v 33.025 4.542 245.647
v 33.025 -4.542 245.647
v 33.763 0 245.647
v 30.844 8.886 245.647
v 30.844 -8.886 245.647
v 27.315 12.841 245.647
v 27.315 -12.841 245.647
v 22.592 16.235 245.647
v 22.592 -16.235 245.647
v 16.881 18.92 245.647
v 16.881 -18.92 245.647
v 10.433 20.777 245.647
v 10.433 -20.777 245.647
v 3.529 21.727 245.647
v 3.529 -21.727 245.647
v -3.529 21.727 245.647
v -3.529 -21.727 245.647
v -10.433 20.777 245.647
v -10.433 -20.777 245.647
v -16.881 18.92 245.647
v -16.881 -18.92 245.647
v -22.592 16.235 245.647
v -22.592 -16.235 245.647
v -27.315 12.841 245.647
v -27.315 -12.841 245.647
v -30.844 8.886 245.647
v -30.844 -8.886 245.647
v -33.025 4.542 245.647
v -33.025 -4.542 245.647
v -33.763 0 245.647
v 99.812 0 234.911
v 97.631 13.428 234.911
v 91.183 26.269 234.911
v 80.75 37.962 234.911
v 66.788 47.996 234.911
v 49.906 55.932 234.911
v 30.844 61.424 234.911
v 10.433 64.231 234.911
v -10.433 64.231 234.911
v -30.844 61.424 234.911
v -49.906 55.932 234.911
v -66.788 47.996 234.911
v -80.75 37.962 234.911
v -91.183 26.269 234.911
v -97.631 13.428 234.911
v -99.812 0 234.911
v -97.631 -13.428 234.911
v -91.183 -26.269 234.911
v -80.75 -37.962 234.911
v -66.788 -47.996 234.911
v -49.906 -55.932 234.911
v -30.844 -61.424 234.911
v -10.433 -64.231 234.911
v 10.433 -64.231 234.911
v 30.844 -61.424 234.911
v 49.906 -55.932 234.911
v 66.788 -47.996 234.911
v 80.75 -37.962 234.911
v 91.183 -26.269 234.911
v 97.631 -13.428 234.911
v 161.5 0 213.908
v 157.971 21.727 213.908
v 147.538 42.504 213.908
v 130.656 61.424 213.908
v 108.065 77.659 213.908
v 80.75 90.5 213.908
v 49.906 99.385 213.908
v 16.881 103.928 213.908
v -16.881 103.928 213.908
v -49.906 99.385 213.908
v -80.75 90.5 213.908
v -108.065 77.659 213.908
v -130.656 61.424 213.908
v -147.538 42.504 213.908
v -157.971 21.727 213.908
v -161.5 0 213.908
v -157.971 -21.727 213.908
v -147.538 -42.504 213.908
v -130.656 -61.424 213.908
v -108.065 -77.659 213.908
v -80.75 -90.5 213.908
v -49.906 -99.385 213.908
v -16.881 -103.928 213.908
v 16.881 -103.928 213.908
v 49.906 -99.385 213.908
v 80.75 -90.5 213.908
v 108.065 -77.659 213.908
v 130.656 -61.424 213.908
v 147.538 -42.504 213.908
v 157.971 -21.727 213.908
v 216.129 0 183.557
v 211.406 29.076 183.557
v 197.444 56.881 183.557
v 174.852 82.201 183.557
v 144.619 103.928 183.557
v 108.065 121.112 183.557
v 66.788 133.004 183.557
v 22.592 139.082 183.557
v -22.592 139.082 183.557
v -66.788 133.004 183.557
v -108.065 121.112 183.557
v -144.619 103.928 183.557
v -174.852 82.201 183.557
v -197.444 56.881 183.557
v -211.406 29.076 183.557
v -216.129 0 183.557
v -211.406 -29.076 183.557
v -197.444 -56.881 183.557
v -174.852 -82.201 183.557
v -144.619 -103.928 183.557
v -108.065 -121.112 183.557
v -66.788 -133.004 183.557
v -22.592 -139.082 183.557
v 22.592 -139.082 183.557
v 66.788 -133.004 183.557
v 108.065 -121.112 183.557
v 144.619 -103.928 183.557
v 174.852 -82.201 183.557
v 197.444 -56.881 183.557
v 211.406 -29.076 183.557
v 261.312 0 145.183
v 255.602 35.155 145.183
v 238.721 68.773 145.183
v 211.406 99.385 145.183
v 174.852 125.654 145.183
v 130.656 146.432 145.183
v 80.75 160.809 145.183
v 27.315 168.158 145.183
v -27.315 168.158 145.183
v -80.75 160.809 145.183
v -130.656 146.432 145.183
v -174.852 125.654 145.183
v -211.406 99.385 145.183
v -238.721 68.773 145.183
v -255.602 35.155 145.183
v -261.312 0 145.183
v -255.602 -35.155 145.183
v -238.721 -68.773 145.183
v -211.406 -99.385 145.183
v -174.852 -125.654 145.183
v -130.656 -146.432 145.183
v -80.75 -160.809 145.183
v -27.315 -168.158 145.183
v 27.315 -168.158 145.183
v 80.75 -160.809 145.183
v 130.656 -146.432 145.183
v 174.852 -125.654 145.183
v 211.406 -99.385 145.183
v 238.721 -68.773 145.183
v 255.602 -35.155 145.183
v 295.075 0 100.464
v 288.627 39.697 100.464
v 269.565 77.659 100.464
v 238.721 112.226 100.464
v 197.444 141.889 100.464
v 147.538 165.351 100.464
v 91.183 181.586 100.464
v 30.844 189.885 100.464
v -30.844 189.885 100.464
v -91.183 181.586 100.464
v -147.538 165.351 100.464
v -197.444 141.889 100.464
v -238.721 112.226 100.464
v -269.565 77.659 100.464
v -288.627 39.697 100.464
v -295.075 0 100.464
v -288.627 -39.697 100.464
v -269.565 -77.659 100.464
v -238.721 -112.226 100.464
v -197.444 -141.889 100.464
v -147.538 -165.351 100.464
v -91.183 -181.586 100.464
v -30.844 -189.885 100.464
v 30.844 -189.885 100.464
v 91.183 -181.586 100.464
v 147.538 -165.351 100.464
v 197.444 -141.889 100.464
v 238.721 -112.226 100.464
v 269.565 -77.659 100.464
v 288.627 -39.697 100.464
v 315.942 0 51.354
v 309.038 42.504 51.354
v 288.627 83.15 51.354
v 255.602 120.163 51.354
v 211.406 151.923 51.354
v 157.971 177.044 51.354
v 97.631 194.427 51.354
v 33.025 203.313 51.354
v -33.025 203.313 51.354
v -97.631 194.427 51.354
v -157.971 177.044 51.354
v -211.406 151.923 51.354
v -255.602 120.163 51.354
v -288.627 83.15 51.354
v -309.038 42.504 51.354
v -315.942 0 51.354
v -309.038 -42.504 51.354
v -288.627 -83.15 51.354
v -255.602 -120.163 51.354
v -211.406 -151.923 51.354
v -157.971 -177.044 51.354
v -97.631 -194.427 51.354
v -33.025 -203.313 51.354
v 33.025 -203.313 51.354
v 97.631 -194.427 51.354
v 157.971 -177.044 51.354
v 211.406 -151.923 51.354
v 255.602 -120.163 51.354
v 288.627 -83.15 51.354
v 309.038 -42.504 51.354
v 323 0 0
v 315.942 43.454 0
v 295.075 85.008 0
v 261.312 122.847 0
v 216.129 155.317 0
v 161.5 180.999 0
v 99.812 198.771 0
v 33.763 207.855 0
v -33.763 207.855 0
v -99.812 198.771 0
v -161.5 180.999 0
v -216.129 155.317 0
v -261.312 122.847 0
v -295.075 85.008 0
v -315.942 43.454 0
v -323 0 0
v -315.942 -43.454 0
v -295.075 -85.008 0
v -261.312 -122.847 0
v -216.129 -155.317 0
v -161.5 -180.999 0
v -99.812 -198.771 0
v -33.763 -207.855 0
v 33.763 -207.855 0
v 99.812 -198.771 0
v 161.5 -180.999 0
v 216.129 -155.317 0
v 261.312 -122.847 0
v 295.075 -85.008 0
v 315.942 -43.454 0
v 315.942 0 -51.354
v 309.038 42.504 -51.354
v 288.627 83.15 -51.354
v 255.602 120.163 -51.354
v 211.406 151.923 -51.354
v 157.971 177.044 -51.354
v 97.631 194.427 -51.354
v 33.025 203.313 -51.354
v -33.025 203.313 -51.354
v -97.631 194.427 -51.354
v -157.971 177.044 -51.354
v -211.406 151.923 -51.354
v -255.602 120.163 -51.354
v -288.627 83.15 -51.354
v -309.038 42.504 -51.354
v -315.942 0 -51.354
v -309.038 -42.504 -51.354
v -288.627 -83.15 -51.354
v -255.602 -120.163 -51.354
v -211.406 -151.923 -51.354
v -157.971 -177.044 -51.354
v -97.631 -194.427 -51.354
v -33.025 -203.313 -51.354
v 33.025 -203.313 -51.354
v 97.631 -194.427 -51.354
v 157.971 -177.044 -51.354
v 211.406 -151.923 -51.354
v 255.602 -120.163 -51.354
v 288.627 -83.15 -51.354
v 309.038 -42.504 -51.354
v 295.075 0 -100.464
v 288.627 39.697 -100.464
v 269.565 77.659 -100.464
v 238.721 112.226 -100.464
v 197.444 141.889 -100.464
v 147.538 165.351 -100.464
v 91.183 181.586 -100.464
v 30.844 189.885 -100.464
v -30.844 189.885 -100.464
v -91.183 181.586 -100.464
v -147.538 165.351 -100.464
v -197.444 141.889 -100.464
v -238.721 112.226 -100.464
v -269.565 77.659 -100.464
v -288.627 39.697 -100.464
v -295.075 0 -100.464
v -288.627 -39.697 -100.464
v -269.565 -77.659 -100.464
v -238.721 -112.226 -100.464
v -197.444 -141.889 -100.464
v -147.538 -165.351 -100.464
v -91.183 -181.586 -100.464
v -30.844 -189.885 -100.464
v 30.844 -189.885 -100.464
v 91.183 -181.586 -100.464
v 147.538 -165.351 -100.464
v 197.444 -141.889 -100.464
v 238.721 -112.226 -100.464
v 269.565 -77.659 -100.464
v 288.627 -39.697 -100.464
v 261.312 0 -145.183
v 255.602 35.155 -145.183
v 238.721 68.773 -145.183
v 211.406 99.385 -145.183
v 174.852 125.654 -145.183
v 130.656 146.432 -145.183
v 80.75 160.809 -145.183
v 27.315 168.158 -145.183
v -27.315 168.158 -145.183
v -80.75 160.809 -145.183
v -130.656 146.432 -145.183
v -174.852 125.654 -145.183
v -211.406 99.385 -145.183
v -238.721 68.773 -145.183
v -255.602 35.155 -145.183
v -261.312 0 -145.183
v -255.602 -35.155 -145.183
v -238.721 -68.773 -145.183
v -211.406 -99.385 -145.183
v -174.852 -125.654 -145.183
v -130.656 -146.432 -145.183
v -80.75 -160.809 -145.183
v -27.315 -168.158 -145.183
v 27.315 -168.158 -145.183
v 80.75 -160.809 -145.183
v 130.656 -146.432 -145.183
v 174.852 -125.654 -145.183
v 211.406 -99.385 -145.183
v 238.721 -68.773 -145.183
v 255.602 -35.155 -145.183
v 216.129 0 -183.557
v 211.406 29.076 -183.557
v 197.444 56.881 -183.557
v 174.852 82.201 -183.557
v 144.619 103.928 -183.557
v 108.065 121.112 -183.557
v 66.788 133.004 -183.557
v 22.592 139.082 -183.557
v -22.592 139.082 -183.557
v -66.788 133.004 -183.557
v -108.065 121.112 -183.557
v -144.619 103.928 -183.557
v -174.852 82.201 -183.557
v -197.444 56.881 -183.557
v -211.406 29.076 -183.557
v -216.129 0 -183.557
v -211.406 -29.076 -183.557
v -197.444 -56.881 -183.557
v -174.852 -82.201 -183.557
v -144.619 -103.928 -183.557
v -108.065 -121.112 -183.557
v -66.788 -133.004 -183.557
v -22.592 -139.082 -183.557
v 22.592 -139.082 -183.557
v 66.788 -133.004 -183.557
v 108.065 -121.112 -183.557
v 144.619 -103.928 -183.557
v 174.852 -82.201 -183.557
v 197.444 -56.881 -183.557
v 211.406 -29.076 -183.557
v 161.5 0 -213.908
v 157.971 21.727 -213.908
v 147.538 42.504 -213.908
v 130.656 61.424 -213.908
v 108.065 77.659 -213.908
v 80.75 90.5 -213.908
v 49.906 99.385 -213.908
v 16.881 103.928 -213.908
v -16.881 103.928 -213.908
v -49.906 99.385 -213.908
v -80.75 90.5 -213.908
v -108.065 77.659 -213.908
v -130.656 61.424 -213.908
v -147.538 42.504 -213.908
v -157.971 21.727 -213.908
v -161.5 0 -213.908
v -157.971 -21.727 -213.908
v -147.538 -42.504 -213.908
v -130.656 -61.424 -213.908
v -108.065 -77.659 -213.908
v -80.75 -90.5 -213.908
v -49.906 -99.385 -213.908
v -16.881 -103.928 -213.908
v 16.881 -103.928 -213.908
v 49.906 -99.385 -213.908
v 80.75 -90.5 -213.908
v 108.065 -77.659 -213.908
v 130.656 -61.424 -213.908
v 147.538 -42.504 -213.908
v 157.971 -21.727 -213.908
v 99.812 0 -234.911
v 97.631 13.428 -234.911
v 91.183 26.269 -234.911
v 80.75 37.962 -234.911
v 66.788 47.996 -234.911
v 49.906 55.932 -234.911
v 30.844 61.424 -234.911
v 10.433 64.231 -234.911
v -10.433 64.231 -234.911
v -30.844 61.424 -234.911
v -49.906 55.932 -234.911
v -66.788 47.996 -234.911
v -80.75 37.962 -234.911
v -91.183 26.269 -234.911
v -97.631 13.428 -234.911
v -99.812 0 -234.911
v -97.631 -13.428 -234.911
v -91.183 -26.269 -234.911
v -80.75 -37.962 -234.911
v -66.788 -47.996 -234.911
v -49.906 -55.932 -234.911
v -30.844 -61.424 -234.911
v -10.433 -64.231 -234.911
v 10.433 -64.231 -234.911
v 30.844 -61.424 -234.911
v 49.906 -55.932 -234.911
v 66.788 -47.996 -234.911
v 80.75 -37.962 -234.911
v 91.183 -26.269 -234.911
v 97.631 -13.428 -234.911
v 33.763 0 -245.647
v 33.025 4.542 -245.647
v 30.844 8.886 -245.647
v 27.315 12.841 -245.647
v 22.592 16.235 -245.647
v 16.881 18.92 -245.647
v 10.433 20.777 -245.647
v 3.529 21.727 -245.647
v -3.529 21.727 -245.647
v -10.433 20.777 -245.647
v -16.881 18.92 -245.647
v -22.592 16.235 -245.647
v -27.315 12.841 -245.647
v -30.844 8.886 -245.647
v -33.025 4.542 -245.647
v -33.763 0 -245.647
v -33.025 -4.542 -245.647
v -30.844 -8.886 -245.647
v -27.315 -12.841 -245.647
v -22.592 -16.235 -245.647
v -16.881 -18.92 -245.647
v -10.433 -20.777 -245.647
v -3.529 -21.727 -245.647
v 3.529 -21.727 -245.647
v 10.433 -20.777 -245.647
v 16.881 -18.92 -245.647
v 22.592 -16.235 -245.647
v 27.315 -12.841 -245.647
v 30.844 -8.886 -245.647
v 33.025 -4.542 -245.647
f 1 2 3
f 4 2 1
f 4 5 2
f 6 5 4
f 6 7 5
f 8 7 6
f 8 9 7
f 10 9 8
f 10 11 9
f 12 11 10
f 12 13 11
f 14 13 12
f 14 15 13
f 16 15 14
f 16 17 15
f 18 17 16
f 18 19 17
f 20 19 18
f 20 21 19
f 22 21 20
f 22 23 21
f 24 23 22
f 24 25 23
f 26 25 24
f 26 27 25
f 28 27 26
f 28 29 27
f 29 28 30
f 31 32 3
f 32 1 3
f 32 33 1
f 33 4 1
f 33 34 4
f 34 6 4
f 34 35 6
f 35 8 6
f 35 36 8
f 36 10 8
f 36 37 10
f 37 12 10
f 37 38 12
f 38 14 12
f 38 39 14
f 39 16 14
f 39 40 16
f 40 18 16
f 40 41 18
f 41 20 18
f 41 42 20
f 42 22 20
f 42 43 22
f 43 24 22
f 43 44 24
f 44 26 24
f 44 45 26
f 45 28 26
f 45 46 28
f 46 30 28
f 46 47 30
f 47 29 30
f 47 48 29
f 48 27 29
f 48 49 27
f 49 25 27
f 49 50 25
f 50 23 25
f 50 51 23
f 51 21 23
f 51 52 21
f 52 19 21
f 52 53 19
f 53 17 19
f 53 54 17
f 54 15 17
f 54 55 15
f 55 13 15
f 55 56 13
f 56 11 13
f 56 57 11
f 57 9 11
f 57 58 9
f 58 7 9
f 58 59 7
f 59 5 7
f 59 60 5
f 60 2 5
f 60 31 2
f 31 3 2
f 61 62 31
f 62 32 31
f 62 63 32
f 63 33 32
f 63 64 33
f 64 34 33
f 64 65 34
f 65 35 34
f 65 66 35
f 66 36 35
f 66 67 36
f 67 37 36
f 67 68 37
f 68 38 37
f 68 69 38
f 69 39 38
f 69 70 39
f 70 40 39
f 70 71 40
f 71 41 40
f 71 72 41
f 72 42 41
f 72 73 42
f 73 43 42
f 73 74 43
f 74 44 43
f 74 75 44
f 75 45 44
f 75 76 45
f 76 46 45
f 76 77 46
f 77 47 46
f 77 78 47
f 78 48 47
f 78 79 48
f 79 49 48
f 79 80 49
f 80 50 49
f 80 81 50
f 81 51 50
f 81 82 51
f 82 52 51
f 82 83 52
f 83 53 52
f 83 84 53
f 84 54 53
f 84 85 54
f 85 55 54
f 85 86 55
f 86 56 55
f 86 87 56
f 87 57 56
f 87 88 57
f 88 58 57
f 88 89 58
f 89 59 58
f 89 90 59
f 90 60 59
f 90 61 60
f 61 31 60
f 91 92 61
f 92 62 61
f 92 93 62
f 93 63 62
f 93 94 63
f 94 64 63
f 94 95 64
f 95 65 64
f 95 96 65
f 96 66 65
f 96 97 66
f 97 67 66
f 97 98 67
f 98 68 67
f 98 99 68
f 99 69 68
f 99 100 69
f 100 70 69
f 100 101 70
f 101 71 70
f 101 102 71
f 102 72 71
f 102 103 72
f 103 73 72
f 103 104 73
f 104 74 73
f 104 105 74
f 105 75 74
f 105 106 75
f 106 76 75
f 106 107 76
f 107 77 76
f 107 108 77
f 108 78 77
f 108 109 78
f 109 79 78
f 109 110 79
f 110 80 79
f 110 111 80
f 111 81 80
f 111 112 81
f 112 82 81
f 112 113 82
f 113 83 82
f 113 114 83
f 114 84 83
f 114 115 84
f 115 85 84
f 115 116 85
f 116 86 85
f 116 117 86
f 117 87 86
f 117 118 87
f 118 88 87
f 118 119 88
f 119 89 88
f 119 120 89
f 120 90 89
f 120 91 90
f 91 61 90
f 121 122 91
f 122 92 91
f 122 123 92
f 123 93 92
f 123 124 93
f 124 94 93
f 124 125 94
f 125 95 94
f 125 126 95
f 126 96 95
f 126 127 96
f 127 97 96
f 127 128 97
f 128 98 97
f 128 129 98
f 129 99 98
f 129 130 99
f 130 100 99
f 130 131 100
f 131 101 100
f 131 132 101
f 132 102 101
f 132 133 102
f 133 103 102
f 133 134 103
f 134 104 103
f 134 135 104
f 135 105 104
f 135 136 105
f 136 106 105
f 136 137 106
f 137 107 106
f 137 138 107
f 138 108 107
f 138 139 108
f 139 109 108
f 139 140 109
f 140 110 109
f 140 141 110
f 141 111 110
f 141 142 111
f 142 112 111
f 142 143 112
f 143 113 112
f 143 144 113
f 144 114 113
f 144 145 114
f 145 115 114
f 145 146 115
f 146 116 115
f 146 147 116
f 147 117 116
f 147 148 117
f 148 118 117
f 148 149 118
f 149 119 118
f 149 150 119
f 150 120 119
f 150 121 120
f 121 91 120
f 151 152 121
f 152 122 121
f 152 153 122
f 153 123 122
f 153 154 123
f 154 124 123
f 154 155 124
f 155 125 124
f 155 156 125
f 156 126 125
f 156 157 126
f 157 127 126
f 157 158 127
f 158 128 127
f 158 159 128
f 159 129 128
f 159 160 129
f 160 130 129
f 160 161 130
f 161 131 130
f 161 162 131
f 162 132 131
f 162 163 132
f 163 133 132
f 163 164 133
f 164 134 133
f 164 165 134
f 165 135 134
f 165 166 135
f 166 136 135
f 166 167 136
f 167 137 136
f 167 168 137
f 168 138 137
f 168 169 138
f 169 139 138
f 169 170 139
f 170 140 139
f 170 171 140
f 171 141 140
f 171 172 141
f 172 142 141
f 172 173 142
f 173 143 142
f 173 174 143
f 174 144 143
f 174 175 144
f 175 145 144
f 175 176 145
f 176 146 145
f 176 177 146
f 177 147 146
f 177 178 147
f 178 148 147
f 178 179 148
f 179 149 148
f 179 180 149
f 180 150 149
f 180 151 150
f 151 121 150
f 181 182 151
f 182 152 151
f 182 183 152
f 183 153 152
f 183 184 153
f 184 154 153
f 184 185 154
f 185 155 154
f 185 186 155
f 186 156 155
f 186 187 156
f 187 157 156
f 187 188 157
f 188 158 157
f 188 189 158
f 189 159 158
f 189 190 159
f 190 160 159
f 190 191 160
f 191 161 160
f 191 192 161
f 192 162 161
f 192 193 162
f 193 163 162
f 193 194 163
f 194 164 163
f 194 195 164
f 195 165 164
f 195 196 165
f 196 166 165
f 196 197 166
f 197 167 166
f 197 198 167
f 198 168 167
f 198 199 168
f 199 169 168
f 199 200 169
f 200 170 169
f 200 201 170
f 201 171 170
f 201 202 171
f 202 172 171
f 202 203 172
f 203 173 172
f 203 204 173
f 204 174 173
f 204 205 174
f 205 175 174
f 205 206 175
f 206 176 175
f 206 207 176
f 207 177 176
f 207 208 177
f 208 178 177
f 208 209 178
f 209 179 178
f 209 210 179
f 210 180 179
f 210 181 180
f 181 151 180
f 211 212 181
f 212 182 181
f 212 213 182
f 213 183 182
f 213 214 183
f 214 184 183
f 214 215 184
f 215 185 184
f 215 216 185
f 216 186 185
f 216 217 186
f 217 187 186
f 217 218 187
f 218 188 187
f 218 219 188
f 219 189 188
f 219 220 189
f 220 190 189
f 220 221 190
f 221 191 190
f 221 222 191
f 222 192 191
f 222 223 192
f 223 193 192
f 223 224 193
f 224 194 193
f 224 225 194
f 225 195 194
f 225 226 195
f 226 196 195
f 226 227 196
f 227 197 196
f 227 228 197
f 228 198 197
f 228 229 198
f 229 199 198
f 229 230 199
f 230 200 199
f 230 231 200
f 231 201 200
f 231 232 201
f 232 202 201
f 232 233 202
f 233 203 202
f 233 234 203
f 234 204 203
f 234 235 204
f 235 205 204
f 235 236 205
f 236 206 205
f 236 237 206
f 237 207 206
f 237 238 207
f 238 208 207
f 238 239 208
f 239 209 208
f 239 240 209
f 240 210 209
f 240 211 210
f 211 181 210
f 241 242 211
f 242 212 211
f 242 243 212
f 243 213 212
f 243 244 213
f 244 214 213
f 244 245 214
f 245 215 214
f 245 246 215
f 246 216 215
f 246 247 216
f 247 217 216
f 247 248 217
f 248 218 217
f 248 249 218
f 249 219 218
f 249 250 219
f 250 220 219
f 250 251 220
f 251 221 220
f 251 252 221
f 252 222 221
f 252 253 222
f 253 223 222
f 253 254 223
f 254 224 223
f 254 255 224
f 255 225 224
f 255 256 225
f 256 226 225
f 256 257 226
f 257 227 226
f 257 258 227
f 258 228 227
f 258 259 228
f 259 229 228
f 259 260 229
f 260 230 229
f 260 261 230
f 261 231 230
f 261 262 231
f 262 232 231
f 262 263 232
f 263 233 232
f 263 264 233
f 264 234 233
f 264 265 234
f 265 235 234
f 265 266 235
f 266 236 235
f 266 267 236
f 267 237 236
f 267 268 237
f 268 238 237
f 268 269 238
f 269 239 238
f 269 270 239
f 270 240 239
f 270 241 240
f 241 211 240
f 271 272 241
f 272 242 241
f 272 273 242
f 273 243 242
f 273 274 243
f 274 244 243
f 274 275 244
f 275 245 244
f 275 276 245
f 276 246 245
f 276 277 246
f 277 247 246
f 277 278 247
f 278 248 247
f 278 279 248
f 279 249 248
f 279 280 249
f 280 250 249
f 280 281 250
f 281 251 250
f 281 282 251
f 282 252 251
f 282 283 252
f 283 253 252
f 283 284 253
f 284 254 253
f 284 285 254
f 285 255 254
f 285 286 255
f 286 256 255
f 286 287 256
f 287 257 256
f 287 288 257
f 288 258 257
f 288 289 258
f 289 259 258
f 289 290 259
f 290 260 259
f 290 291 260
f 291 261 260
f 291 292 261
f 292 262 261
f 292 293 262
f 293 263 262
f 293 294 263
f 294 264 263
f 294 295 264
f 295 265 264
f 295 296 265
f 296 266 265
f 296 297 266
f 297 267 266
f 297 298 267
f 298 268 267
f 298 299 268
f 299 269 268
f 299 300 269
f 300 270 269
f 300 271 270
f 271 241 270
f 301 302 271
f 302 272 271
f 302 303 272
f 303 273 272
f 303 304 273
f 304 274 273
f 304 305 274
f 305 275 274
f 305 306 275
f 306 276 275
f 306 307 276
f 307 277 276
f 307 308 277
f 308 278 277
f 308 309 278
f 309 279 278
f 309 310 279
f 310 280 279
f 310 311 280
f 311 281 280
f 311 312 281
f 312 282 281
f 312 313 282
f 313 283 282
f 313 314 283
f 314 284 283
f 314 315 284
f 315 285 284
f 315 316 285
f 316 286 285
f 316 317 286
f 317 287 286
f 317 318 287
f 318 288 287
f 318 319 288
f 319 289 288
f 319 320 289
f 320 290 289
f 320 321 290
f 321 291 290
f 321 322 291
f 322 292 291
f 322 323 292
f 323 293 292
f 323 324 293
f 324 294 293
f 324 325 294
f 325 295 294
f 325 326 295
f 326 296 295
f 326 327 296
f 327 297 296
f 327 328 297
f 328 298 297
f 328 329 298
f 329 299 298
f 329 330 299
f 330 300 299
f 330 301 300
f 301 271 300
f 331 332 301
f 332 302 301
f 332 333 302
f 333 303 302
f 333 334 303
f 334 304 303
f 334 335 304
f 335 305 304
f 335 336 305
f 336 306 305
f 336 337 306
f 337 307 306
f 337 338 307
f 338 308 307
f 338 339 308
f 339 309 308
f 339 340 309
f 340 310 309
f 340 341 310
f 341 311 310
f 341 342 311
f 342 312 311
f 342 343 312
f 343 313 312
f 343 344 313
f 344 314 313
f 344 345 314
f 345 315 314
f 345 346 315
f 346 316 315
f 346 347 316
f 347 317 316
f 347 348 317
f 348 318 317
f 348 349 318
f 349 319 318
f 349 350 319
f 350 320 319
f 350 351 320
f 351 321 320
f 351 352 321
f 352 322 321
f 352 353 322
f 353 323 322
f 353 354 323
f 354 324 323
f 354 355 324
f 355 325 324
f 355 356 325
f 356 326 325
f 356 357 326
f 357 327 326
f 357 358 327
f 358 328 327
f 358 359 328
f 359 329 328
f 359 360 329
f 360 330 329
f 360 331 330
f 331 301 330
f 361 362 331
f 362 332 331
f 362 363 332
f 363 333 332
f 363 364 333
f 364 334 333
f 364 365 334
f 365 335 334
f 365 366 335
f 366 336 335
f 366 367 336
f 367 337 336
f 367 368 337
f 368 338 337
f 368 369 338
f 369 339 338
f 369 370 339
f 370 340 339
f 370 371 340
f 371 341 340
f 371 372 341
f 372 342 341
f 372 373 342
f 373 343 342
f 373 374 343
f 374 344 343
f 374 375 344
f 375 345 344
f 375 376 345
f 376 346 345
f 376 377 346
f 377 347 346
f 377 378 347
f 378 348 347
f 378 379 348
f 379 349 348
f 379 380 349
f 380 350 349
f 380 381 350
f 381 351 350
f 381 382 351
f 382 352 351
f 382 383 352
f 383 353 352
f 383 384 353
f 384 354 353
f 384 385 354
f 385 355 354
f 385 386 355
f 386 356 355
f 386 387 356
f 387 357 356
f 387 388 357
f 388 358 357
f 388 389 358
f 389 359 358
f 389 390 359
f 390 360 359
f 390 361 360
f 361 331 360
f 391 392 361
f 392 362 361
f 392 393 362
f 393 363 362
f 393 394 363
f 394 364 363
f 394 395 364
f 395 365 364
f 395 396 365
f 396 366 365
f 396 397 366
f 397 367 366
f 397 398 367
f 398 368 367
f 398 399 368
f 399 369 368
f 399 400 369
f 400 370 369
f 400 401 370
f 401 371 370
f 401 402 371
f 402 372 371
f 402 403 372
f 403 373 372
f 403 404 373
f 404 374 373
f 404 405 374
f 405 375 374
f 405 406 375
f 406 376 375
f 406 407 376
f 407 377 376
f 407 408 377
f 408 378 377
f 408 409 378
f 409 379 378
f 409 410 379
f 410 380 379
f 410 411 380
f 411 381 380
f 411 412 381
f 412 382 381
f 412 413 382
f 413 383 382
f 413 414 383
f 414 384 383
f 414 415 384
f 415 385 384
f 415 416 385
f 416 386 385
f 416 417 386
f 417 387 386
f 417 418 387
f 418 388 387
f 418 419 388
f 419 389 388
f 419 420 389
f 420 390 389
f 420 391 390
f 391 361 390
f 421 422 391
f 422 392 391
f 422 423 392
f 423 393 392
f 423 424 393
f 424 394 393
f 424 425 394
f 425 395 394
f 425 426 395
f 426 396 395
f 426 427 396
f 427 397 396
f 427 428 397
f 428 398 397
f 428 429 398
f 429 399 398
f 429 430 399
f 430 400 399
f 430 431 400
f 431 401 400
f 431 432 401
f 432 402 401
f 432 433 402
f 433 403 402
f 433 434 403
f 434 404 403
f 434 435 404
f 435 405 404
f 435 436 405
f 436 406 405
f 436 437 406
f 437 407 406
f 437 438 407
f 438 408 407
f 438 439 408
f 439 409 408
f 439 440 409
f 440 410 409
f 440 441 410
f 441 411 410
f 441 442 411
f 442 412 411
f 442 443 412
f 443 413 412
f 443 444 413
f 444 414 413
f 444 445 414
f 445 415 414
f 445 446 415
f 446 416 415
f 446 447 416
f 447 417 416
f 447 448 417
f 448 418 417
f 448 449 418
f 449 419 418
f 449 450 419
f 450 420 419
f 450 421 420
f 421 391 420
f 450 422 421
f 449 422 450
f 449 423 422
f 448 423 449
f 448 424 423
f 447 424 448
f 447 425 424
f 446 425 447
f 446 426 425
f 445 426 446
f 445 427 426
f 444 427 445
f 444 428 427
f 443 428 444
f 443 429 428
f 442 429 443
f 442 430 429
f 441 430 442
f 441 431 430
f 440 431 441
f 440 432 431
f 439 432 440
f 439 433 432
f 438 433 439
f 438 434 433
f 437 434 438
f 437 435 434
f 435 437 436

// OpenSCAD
// Generated by SolidPython 1.0.1 on 2020-07-29 00:46:53


scale(v = [17, 11, 13]) {
	sphere(r = 19);
}
/***********************************************
*********      SolidPython code:      **********
************************************************
 
# import packages: SolidPython
from solid import *
from solid.utils import *
from itertools import chain, combinations, permutations


class Resize:

    def __init__(self, scad_file):
        self.scad_file = scad_file
        #self.scad_file = import_scad(scad_file)
        # cone/cylinder param:
        self.r1 = 0
        self.r2 = 0
        self.h = 0
        # rectangular prism param:
        self.w = 0
        self.l = 0
        # ellipse param:
        self.r = 0

    # import OpenScad code (file name corresponds to shape)


    # classify shape + parameters
    def assign(self, param1, param2, param3):
        if self.scad_file == 'cone.scad':
            self.r1 = param1
            self.r2 = param2
            self.h = param3
        elif self.scad_file == 'cylinder.scad':
            self.r1 = param1
            self.r2 = param2
            self.h = param3
        elif self.scad_file == 'rectangularPrism.scad':
            self.h = param1
            self.l = param2
            self.w = param3
        else:
            self.r = param1
            self.h = param2

    # resize parameters
    def iterate(self):
        x = range(3, 20, 2)
        i = 1
        if self.scad_file == 'cone.scad':
            tempList = list(permutations(x, 2))
            for temp in tempList:
                param1 = temp[0]
                param2 = temp[1]
                filepath = 'produced_scad_files/' + 'cone' + str(param1) + '_' + str(param2) + '_' + '.scad'
                scad_render_to_file(cylinder(h=param1, r1=param2, r2=0), filepath)

        elif self.scad_file == 'cylinder.scad':
            tempList = list(permutations(x, 3))
            for temp in tempList:
                param1 = temp[0]
                param2 = temp[1]
                filepath = 'produced_scad_files/' + 'cylinder' + str(param1) + '_' + str(param2) + '_' + '.scad'
                scad_render_to_file(cylinder(h=param1, r1=param2, r2=param2), filepath)

        elif self.scad_file == 'rectangularPrism.scad':
            tempList = list(permutations(x, 3))
            for temp in tempList:
                param1 = temp[0]
                param2 = temp[1]
                param3 = temp[2]
                filepath = 'produced_scad_files/' + 'rectangularPrism' + str(param1) + '_' + str(param2) + '_' + str(
                    param3) + '.scad'
                scad_render_to_file(cube(size=(param1, param2, param3)), filepath)

        elif self.scad_file == 'ellipse.scad':
            tempList = list(permutations(x, 4))
            for temp in tempList:
                param1 = temp[0]
                param2 = temp[1]
                param3 = temp[2]
                param4 = temp[3]
                filepath = 'produced_scad_files/' + 'ellipse' + str(param1) + '_' + str(param2) + '_' + str(param3) + '_' + str(param4) + '.scad'
                scad_render_to_file(scale([param1, param2, param3])(sphere(r=param4)), filepath)

    def render_to_scadfile(self):
        scad_render_to_file(scad, 'example.scad') 
 
************************************************/
